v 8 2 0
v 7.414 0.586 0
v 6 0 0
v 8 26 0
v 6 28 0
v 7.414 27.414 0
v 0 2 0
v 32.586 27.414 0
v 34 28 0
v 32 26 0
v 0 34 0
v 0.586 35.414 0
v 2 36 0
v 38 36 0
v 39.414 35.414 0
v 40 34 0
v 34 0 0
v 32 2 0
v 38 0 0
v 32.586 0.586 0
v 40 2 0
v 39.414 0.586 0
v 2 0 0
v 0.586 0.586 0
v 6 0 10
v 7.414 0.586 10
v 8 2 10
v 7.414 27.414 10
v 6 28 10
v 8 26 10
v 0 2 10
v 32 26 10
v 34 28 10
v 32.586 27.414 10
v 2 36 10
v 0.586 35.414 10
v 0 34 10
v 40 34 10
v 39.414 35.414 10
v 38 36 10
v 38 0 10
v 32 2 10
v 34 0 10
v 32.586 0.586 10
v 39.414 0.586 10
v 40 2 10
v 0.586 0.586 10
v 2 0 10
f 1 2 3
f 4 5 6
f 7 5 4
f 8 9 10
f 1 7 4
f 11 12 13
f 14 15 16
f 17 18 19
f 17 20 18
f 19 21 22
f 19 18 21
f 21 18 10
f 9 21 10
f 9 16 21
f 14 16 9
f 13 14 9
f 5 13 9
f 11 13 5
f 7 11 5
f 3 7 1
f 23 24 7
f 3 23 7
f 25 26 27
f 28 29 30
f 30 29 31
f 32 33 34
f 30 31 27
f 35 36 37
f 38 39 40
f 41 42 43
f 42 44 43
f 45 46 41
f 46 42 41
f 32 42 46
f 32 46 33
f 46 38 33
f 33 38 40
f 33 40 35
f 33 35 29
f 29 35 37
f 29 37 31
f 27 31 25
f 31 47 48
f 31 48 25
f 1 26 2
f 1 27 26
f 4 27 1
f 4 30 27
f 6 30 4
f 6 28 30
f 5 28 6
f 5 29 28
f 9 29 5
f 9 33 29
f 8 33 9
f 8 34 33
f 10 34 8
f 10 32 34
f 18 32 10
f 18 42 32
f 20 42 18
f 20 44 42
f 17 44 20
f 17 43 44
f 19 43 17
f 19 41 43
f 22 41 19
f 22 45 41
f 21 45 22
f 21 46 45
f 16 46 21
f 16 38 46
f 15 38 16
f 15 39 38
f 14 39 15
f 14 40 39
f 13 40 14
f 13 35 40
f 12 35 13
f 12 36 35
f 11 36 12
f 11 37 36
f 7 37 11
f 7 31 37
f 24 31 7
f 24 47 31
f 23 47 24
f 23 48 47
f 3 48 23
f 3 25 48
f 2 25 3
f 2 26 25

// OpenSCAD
$fn = 32;

// ----------------------------------------------------------------------
// Clip blank: staple clip, 10 mm thick
// ----------------------------------------------------------------------

// --- parameters (mm) ---
profile_height = 10;      // extrusion height
profile_points = 24;      // points of the closed outline

profile = [[0, 2], [0.586, 0.586], [2, 0], [6, 0], [7.414, 0.586], [8, 2], [8, 26], [7.414, 27.414], [6, 28], [34, 28], [32.586, 27.414], [32, 26], [32, 2], [32.586, 0.586], [34, 0], [38, 0], [39.414, 0.586], [40, 2], [40, 34], [39.414, 35.414], [38, 36], [2, 36], [0.586, 35.414], [0, 34]];  // single closed polygon, 24 points, counter clockwise

// --- the one profile operation ---
linear_extrude(height = profile_height) polygon(points = profile);
